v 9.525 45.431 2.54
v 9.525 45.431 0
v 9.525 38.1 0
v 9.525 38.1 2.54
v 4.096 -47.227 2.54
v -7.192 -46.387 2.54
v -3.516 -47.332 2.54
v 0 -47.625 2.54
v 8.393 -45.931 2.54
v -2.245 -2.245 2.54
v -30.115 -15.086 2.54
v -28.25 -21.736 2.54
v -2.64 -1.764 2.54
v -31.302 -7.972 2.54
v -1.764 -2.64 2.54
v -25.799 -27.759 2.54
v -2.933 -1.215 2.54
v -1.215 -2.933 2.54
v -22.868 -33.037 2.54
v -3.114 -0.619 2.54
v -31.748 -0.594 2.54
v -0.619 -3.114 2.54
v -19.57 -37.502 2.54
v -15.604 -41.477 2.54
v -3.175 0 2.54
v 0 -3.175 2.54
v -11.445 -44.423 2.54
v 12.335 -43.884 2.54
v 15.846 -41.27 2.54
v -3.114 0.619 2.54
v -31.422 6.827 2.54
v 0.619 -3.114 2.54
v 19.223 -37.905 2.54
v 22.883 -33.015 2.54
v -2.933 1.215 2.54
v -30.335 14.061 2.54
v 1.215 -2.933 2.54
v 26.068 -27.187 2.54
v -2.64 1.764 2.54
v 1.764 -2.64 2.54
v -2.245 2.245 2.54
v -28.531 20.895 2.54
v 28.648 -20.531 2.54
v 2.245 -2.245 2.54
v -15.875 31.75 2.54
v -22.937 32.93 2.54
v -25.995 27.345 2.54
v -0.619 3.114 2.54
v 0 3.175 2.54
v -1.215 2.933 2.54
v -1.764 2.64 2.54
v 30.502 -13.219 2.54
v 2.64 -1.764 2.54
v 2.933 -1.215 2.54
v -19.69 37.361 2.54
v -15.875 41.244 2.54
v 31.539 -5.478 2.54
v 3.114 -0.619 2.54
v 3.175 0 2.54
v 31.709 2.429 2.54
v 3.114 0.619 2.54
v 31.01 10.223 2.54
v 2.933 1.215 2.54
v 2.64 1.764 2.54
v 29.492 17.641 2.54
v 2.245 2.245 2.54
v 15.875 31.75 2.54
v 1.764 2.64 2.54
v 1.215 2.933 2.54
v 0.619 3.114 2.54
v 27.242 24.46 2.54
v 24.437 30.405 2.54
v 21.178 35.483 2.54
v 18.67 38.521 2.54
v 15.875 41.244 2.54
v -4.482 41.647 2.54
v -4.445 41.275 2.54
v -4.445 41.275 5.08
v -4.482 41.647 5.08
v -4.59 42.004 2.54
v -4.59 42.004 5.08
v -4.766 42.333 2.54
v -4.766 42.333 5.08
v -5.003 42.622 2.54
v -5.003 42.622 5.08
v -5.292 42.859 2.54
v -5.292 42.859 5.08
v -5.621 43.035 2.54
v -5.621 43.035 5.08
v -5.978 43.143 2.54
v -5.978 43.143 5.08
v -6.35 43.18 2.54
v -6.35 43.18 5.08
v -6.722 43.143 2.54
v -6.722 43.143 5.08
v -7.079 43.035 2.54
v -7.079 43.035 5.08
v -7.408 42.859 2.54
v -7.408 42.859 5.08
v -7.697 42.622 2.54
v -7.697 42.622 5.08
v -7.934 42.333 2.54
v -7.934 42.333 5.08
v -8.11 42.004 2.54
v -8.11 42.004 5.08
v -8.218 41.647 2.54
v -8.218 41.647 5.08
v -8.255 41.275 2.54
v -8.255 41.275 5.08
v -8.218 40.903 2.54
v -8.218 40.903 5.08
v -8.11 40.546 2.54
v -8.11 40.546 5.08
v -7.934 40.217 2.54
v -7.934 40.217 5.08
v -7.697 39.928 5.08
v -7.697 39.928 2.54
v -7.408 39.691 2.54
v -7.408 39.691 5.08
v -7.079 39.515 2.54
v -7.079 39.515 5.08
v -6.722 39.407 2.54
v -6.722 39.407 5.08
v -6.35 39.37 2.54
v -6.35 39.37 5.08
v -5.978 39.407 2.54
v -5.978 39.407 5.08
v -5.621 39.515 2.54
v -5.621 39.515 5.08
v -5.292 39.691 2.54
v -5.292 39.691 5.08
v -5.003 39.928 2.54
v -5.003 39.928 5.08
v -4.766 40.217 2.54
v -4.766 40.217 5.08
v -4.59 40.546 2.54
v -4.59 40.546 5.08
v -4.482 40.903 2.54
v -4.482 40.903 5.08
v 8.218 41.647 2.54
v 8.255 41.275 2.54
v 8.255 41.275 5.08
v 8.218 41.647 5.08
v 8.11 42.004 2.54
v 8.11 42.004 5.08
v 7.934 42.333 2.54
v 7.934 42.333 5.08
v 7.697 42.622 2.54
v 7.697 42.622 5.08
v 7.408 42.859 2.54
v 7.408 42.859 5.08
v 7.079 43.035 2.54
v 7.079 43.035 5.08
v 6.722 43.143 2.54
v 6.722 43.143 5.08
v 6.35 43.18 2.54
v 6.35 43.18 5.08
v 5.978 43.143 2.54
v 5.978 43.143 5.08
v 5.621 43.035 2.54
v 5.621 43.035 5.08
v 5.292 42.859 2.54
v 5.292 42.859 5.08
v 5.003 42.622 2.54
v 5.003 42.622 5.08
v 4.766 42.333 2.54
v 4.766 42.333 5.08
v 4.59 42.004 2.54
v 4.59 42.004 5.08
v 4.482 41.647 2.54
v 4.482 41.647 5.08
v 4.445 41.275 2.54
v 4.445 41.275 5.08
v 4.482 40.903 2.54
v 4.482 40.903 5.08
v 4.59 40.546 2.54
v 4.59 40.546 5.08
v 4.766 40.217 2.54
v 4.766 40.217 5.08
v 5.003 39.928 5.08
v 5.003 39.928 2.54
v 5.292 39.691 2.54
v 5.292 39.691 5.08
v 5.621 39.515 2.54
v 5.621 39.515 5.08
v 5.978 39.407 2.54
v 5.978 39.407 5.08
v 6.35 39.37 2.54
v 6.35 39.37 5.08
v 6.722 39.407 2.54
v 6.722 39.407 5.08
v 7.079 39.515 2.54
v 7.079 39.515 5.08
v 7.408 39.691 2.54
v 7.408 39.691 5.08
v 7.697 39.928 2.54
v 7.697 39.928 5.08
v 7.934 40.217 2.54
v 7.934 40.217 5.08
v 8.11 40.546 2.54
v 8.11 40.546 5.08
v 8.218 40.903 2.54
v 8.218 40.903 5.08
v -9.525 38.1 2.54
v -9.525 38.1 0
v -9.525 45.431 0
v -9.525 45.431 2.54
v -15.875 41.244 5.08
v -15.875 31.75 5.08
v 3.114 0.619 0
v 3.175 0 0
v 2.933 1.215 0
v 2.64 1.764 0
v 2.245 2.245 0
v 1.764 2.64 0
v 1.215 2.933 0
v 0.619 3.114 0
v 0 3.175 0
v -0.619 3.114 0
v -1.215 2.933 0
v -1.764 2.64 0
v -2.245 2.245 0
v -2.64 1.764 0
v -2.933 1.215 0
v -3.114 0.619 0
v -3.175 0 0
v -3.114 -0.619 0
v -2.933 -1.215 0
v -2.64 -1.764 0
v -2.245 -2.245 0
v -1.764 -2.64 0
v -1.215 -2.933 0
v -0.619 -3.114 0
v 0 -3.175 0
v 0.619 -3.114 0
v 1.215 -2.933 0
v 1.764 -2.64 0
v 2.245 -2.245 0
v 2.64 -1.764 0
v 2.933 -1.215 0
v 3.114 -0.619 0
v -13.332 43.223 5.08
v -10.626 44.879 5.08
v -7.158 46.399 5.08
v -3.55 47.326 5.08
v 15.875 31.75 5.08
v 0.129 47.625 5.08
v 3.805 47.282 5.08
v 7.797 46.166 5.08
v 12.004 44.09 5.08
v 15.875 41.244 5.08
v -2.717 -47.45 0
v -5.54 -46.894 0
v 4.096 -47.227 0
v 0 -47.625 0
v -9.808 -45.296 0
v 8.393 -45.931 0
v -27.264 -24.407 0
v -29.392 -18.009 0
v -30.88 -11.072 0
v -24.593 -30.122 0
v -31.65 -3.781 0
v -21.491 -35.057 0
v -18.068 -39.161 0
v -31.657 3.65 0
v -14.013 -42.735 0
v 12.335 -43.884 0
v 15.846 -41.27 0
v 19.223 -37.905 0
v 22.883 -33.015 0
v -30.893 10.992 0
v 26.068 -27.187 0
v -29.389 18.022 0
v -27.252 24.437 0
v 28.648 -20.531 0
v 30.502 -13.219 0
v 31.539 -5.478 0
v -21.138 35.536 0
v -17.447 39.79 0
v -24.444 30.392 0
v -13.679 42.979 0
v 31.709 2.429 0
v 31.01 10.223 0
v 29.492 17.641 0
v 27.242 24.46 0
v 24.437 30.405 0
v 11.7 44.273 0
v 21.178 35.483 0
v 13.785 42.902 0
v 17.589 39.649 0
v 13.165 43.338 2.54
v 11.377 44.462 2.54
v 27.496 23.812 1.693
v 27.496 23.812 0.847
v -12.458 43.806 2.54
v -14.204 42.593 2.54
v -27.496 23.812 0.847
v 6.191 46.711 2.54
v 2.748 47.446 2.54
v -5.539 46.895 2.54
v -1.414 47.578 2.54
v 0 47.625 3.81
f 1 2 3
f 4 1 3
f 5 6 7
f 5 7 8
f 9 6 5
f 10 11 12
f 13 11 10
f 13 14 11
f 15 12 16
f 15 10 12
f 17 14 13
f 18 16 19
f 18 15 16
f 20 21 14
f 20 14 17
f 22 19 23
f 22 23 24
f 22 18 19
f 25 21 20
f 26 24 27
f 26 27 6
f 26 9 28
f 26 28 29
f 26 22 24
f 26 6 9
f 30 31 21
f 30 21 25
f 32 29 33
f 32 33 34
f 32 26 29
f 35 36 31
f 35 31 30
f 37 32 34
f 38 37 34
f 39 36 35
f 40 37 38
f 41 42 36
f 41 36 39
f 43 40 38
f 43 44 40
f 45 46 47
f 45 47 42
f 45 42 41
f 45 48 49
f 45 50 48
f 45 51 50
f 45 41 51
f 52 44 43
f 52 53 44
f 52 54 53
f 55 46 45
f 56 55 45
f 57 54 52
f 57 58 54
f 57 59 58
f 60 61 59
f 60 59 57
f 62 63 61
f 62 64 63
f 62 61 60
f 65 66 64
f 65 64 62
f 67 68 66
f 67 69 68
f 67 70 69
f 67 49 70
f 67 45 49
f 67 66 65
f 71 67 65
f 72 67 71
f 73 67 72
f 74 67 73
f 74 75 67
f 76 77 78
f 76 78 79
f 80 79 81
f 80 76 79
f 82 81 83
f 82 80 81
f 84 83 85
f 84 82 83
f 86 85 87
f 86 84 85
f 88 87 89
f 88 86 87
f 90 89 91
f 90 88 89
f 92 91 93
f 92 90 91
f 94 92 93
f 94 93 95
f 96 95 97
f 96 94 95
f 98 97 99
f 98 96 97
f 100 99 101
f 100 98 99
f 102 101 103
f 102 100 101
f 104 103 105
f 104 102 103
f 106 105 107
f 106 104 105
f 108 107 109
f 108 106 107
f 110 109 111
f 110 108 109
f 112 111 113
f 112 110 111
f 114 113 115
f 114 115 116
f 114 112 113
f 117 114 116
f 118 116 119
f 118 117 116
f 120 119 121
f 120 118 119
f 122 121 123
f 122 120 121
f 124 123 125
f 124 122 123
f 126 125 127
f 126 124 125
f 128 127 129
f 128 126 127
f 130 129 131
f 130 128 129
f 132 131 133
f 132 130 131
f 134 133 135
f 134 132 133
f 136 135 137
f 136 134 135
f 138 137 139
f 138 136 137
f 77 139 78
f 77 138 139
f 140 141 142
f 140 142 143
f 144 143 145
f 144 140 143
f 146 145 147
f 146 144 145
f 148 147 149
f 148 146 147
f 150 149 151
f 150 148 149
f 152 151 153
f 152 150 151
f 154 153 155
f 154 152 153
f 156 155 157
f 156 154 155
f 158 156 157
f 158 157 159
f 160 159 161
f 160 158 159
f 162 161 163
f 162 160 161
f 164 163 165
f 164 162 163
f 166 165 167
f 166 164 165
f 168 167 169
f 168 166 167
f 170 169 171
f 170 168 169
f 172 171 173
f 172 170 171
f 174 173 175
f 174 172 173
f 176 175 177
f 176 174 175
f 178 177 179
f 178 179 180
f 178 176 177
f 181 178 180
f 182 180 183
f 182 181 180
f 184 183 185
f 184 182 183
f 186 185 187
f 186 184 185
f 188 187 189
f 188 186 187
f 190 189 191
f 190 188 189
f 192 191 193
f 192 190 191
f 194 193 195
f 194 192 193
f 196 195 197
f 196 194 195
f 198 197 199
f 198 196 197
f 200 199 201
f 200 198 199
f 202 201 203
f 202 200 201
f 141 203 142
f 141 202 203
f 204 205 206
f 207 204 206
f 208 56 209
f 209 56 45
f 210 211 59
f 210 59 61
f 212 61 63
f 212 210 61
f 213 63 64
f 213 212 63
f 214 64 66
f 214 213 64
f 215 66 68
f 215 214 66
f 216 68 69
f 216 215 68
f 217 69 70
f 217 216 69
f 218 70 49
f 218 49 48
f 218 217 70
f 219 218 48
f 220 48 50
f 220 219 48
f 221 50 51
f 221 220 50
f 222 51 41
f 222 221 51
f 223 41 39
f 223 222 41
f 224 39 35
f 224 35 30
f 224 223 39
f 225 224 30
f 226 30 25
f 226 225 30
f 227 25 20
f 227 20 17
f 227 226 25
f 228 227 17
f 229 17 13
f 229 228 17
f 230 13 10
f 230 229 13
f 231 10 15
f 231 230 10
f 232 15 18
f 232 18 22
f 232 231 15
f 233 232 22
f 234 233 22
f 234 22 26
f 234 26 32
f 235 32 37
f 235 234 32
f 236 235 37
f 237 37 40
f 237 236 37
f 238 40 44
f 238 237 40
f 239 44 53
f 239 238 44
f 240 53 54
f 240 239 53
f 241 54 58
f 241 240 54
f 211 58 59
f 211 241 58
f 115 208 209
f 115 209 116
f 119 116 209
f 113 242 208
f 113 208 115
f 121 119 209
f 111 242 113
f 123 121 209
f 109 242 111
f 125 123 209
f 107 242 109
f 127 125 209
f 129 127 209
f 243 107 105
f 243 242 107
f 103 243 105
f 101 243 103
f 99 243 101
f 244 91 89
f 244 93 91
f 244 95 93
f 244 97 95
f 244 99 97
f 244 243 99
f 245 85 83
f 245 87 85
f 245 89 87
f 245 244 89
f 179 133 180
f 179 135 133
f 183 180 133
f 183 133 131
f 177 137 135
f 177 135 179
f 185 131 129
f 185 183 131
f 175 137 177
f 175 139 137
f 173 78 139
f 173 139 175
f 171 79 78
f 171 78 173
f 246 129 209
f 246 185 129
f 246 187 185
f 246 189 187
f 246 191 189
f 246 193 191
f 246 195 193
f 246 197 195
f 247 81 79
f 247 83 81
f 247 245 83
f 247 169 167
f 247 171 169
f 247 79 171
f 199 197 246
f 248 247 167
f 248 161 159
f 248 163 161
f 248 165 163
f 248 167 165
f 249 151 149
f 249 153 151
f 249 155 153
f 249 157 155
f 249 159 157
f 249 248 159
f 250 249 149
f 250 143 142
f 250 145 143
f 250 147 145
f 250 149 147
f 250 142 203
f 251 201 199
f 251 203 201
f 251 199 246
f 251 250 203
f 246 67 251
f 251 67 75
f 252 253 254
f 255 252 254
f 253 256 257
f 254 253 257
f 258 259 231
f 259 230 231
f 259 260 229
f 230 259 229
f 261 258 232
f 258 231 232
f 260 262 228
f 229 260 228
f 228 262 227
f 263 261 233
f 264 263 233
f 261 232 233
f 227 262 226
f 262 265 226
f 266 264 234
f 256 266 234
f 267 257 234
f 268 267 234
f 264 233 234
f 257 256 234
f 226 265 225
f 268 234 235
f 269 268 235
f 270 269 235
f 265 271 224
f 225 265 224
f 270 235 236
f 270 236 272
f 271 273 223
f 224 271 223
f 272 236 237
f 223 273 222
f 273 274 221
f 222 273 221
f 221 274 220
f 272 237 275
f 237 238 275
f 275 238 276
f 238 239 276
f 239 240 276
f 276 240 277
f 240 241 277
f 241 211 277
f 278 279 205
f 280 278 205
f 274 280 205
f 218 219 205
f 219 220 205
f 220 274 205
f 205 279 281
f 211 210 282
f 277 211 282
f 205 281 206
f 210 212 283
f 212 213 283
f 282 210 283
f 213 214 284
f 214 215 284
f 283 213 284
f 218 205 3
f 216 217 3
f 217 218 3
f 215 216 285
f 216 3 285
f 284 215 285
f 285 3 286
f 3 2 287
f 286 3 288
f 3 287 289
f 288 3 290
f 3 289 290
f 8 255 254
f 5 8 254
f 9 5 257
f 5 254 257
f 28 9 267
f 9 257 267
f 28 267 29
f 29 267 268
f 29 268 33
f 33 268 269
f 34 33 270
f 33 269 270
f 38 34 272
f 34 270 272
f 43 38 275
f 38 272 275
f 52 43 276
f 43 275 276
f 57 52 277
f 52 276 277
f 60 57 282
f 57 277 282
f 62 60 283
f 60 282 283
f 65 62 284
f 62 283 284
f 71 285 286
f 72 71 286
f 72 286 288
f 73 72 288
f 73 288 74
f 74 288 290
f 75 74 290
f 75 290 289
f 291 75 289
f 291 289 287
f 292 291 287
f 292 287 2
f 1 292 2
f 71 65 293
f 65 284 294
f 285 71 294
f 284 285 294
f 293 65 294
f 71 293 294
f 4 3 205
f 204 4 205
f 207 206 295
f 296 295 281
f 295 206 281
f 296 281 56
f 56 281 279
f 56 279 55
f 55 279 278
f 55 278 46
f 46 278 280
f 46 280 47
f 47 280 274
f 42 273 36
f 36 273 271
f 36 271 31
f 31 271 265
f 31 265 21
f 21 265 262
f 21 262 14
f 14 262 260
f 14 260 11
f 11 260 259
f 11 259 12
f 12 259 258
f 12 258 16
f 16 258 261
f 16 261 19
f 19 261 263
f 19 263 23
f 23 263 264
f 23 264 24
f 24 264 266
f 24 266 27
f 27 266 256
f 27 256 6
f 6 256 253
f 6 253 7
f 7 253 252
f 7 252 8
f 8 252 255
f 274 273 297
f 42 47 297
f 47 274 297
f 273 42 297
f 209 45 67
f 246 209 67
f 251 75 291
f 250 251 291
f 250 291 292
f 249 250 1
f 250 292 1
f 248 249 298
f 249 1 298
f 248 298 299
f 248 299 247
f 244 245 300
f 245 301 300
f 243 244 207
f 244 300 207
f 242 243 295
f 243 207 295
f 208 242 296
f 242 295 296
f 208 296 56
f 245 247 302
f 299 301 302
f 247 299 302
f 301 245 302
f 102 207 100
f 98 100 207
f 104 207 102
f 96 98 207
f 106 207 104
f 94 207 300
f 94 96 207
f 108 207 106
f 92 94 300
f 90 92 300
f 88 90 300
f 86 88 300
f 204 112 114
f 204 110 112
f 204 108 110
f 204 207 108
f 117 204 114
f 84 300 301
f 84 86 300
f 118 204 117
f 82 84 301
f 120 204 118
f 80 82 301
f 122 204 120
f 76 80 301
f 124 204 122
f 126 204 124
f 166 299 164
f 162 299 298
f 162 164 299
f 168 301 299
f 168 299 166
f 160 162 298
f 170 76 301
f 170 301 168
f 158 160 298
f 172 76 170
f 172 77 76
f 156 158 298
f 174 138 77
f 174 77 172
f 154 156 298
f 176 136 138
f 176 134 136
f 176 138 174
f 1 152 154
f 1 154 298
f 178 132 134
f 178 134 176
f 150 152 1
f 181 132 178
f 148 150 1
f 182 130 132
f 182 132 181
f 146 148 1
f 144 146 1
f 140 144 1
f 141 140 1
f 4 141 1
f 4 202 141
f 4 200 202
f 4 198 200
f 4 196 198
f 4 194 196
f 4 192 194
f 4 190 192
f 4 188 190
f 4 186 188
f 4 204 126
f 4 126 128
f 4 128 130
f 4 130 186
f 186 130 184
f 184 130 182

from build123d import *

# Parameters (mm, degrees)
F0_R     = 1.905
F0_R_2   = 3.175
F1_DEPTH = 2.54
F2_R     = 1.905
F3_DEPTH = 2.54
F4_R     = 1.905
F5_DEPTH = 2.54


with BuildPart() as f1:
    # F0 (on Top) → F1 (new body)
    with BuildSketch(Plane.XY):
        with BuildLine():
            add(Edge.make_bspline(
                [(0, -47.625), (54.9926131403, -47.625), (27.4963065702, 23.8125), (0, 95.25), (-27.4963065702, 23.8125), (-54.9926131403, -47.625), (0, -47.625)],
                knots=[0, 0, 0, 2.0943951024, 2.0943951024, 4.1887902048, 4.1887902048, 6.2831853072, 6.2831853072, 6.2831853072], degree=2, weights=[1, 0.5, 1, 0.5, 1, 0.5, 1]))
        make_face()
        with Locations((-6.35, 41.275)):
            Circle(F0_R, mode=Mode.SUBTRACT)
        Circle(F0_R_2, mode=Mode.SUBTRACT)
        with Locations((6.35, 41.275)):
            Circle(F0_R, mode=Mode.SUBTRACT)
    extrude(amount=F1_DEPTH)

    # F2 (on face) → F3 (join)
    with BuildSketch(Plane.XY.offset(2.54)):
        with BuildLine():
            Line((-15.875, 31.75), (0, 31.75))
            Line((0, 31.75), (15.875, 31.75))
            Line((15.875, 31.75), (15.875, 41.2444598552))
            add(Edge.make_bspline(
                [(15.875, 41.2444598552), (0, 54.9926131403), (-15.875, 41.2444598552)],
                knots=[2.617993878, 2.617993878, 2.617993878, 3.6651914292, 3.6651914292, 3.6651914292], degree=2, weights=[1, 0.8660254038, 1]))
            Line((-15.875, 41.2444598552), (-15.875, 31.75))
        make_face()
        with Locations((-6.35, 41.275)):
            Circle(F2_R, mode=Mode.SUBTRACT)
        with Locations((6.35, 41.275)):
            Circle(F2_R, mode=Mode.SUBTRACT)
    extrude(amount=F3_DEPTH)

    # F4 (on face) → F5 (cut)
    with BuildSketch(Plane(origin=(0, 0, 0), x_dir=(1, 0, 0), z_dir=(0, 0, -1))):
        with BuildLine():
            Line((9.525, -38.1), (0, -38.1))
            Line((0, -38.1), (-9.525, -38.1))
            Line((-9.525, -38.1), (-9.525, -45.4313544675))
            add(Edge.make_bspline(
                [(-9.525, -45.4313544675), (0, -49.9245653489), (9.525, -45.4313544675)],
                knots=[2.8368999996, 2.8368999996, 2.8368999996, 3.4462853076, 3.4462853076, 3.4462853076], degree=2, weights=[1, 0.9539392014, 1]))
            Line((9.525, -45.4313544675), (9.525, -38.1))
        make_face()
        with Locations((-6.35, -41.275)):
            Circle(F4_R, mode=Mode.SUBTRACT)
        with Locations((6.35, -41.275)):
            Circle(F4_R, mode=Mode.SUBTRACT)
    extrude(amount=-F5_DEPTH, mode=Mode.SUBTRACT)


solid = f1.part
